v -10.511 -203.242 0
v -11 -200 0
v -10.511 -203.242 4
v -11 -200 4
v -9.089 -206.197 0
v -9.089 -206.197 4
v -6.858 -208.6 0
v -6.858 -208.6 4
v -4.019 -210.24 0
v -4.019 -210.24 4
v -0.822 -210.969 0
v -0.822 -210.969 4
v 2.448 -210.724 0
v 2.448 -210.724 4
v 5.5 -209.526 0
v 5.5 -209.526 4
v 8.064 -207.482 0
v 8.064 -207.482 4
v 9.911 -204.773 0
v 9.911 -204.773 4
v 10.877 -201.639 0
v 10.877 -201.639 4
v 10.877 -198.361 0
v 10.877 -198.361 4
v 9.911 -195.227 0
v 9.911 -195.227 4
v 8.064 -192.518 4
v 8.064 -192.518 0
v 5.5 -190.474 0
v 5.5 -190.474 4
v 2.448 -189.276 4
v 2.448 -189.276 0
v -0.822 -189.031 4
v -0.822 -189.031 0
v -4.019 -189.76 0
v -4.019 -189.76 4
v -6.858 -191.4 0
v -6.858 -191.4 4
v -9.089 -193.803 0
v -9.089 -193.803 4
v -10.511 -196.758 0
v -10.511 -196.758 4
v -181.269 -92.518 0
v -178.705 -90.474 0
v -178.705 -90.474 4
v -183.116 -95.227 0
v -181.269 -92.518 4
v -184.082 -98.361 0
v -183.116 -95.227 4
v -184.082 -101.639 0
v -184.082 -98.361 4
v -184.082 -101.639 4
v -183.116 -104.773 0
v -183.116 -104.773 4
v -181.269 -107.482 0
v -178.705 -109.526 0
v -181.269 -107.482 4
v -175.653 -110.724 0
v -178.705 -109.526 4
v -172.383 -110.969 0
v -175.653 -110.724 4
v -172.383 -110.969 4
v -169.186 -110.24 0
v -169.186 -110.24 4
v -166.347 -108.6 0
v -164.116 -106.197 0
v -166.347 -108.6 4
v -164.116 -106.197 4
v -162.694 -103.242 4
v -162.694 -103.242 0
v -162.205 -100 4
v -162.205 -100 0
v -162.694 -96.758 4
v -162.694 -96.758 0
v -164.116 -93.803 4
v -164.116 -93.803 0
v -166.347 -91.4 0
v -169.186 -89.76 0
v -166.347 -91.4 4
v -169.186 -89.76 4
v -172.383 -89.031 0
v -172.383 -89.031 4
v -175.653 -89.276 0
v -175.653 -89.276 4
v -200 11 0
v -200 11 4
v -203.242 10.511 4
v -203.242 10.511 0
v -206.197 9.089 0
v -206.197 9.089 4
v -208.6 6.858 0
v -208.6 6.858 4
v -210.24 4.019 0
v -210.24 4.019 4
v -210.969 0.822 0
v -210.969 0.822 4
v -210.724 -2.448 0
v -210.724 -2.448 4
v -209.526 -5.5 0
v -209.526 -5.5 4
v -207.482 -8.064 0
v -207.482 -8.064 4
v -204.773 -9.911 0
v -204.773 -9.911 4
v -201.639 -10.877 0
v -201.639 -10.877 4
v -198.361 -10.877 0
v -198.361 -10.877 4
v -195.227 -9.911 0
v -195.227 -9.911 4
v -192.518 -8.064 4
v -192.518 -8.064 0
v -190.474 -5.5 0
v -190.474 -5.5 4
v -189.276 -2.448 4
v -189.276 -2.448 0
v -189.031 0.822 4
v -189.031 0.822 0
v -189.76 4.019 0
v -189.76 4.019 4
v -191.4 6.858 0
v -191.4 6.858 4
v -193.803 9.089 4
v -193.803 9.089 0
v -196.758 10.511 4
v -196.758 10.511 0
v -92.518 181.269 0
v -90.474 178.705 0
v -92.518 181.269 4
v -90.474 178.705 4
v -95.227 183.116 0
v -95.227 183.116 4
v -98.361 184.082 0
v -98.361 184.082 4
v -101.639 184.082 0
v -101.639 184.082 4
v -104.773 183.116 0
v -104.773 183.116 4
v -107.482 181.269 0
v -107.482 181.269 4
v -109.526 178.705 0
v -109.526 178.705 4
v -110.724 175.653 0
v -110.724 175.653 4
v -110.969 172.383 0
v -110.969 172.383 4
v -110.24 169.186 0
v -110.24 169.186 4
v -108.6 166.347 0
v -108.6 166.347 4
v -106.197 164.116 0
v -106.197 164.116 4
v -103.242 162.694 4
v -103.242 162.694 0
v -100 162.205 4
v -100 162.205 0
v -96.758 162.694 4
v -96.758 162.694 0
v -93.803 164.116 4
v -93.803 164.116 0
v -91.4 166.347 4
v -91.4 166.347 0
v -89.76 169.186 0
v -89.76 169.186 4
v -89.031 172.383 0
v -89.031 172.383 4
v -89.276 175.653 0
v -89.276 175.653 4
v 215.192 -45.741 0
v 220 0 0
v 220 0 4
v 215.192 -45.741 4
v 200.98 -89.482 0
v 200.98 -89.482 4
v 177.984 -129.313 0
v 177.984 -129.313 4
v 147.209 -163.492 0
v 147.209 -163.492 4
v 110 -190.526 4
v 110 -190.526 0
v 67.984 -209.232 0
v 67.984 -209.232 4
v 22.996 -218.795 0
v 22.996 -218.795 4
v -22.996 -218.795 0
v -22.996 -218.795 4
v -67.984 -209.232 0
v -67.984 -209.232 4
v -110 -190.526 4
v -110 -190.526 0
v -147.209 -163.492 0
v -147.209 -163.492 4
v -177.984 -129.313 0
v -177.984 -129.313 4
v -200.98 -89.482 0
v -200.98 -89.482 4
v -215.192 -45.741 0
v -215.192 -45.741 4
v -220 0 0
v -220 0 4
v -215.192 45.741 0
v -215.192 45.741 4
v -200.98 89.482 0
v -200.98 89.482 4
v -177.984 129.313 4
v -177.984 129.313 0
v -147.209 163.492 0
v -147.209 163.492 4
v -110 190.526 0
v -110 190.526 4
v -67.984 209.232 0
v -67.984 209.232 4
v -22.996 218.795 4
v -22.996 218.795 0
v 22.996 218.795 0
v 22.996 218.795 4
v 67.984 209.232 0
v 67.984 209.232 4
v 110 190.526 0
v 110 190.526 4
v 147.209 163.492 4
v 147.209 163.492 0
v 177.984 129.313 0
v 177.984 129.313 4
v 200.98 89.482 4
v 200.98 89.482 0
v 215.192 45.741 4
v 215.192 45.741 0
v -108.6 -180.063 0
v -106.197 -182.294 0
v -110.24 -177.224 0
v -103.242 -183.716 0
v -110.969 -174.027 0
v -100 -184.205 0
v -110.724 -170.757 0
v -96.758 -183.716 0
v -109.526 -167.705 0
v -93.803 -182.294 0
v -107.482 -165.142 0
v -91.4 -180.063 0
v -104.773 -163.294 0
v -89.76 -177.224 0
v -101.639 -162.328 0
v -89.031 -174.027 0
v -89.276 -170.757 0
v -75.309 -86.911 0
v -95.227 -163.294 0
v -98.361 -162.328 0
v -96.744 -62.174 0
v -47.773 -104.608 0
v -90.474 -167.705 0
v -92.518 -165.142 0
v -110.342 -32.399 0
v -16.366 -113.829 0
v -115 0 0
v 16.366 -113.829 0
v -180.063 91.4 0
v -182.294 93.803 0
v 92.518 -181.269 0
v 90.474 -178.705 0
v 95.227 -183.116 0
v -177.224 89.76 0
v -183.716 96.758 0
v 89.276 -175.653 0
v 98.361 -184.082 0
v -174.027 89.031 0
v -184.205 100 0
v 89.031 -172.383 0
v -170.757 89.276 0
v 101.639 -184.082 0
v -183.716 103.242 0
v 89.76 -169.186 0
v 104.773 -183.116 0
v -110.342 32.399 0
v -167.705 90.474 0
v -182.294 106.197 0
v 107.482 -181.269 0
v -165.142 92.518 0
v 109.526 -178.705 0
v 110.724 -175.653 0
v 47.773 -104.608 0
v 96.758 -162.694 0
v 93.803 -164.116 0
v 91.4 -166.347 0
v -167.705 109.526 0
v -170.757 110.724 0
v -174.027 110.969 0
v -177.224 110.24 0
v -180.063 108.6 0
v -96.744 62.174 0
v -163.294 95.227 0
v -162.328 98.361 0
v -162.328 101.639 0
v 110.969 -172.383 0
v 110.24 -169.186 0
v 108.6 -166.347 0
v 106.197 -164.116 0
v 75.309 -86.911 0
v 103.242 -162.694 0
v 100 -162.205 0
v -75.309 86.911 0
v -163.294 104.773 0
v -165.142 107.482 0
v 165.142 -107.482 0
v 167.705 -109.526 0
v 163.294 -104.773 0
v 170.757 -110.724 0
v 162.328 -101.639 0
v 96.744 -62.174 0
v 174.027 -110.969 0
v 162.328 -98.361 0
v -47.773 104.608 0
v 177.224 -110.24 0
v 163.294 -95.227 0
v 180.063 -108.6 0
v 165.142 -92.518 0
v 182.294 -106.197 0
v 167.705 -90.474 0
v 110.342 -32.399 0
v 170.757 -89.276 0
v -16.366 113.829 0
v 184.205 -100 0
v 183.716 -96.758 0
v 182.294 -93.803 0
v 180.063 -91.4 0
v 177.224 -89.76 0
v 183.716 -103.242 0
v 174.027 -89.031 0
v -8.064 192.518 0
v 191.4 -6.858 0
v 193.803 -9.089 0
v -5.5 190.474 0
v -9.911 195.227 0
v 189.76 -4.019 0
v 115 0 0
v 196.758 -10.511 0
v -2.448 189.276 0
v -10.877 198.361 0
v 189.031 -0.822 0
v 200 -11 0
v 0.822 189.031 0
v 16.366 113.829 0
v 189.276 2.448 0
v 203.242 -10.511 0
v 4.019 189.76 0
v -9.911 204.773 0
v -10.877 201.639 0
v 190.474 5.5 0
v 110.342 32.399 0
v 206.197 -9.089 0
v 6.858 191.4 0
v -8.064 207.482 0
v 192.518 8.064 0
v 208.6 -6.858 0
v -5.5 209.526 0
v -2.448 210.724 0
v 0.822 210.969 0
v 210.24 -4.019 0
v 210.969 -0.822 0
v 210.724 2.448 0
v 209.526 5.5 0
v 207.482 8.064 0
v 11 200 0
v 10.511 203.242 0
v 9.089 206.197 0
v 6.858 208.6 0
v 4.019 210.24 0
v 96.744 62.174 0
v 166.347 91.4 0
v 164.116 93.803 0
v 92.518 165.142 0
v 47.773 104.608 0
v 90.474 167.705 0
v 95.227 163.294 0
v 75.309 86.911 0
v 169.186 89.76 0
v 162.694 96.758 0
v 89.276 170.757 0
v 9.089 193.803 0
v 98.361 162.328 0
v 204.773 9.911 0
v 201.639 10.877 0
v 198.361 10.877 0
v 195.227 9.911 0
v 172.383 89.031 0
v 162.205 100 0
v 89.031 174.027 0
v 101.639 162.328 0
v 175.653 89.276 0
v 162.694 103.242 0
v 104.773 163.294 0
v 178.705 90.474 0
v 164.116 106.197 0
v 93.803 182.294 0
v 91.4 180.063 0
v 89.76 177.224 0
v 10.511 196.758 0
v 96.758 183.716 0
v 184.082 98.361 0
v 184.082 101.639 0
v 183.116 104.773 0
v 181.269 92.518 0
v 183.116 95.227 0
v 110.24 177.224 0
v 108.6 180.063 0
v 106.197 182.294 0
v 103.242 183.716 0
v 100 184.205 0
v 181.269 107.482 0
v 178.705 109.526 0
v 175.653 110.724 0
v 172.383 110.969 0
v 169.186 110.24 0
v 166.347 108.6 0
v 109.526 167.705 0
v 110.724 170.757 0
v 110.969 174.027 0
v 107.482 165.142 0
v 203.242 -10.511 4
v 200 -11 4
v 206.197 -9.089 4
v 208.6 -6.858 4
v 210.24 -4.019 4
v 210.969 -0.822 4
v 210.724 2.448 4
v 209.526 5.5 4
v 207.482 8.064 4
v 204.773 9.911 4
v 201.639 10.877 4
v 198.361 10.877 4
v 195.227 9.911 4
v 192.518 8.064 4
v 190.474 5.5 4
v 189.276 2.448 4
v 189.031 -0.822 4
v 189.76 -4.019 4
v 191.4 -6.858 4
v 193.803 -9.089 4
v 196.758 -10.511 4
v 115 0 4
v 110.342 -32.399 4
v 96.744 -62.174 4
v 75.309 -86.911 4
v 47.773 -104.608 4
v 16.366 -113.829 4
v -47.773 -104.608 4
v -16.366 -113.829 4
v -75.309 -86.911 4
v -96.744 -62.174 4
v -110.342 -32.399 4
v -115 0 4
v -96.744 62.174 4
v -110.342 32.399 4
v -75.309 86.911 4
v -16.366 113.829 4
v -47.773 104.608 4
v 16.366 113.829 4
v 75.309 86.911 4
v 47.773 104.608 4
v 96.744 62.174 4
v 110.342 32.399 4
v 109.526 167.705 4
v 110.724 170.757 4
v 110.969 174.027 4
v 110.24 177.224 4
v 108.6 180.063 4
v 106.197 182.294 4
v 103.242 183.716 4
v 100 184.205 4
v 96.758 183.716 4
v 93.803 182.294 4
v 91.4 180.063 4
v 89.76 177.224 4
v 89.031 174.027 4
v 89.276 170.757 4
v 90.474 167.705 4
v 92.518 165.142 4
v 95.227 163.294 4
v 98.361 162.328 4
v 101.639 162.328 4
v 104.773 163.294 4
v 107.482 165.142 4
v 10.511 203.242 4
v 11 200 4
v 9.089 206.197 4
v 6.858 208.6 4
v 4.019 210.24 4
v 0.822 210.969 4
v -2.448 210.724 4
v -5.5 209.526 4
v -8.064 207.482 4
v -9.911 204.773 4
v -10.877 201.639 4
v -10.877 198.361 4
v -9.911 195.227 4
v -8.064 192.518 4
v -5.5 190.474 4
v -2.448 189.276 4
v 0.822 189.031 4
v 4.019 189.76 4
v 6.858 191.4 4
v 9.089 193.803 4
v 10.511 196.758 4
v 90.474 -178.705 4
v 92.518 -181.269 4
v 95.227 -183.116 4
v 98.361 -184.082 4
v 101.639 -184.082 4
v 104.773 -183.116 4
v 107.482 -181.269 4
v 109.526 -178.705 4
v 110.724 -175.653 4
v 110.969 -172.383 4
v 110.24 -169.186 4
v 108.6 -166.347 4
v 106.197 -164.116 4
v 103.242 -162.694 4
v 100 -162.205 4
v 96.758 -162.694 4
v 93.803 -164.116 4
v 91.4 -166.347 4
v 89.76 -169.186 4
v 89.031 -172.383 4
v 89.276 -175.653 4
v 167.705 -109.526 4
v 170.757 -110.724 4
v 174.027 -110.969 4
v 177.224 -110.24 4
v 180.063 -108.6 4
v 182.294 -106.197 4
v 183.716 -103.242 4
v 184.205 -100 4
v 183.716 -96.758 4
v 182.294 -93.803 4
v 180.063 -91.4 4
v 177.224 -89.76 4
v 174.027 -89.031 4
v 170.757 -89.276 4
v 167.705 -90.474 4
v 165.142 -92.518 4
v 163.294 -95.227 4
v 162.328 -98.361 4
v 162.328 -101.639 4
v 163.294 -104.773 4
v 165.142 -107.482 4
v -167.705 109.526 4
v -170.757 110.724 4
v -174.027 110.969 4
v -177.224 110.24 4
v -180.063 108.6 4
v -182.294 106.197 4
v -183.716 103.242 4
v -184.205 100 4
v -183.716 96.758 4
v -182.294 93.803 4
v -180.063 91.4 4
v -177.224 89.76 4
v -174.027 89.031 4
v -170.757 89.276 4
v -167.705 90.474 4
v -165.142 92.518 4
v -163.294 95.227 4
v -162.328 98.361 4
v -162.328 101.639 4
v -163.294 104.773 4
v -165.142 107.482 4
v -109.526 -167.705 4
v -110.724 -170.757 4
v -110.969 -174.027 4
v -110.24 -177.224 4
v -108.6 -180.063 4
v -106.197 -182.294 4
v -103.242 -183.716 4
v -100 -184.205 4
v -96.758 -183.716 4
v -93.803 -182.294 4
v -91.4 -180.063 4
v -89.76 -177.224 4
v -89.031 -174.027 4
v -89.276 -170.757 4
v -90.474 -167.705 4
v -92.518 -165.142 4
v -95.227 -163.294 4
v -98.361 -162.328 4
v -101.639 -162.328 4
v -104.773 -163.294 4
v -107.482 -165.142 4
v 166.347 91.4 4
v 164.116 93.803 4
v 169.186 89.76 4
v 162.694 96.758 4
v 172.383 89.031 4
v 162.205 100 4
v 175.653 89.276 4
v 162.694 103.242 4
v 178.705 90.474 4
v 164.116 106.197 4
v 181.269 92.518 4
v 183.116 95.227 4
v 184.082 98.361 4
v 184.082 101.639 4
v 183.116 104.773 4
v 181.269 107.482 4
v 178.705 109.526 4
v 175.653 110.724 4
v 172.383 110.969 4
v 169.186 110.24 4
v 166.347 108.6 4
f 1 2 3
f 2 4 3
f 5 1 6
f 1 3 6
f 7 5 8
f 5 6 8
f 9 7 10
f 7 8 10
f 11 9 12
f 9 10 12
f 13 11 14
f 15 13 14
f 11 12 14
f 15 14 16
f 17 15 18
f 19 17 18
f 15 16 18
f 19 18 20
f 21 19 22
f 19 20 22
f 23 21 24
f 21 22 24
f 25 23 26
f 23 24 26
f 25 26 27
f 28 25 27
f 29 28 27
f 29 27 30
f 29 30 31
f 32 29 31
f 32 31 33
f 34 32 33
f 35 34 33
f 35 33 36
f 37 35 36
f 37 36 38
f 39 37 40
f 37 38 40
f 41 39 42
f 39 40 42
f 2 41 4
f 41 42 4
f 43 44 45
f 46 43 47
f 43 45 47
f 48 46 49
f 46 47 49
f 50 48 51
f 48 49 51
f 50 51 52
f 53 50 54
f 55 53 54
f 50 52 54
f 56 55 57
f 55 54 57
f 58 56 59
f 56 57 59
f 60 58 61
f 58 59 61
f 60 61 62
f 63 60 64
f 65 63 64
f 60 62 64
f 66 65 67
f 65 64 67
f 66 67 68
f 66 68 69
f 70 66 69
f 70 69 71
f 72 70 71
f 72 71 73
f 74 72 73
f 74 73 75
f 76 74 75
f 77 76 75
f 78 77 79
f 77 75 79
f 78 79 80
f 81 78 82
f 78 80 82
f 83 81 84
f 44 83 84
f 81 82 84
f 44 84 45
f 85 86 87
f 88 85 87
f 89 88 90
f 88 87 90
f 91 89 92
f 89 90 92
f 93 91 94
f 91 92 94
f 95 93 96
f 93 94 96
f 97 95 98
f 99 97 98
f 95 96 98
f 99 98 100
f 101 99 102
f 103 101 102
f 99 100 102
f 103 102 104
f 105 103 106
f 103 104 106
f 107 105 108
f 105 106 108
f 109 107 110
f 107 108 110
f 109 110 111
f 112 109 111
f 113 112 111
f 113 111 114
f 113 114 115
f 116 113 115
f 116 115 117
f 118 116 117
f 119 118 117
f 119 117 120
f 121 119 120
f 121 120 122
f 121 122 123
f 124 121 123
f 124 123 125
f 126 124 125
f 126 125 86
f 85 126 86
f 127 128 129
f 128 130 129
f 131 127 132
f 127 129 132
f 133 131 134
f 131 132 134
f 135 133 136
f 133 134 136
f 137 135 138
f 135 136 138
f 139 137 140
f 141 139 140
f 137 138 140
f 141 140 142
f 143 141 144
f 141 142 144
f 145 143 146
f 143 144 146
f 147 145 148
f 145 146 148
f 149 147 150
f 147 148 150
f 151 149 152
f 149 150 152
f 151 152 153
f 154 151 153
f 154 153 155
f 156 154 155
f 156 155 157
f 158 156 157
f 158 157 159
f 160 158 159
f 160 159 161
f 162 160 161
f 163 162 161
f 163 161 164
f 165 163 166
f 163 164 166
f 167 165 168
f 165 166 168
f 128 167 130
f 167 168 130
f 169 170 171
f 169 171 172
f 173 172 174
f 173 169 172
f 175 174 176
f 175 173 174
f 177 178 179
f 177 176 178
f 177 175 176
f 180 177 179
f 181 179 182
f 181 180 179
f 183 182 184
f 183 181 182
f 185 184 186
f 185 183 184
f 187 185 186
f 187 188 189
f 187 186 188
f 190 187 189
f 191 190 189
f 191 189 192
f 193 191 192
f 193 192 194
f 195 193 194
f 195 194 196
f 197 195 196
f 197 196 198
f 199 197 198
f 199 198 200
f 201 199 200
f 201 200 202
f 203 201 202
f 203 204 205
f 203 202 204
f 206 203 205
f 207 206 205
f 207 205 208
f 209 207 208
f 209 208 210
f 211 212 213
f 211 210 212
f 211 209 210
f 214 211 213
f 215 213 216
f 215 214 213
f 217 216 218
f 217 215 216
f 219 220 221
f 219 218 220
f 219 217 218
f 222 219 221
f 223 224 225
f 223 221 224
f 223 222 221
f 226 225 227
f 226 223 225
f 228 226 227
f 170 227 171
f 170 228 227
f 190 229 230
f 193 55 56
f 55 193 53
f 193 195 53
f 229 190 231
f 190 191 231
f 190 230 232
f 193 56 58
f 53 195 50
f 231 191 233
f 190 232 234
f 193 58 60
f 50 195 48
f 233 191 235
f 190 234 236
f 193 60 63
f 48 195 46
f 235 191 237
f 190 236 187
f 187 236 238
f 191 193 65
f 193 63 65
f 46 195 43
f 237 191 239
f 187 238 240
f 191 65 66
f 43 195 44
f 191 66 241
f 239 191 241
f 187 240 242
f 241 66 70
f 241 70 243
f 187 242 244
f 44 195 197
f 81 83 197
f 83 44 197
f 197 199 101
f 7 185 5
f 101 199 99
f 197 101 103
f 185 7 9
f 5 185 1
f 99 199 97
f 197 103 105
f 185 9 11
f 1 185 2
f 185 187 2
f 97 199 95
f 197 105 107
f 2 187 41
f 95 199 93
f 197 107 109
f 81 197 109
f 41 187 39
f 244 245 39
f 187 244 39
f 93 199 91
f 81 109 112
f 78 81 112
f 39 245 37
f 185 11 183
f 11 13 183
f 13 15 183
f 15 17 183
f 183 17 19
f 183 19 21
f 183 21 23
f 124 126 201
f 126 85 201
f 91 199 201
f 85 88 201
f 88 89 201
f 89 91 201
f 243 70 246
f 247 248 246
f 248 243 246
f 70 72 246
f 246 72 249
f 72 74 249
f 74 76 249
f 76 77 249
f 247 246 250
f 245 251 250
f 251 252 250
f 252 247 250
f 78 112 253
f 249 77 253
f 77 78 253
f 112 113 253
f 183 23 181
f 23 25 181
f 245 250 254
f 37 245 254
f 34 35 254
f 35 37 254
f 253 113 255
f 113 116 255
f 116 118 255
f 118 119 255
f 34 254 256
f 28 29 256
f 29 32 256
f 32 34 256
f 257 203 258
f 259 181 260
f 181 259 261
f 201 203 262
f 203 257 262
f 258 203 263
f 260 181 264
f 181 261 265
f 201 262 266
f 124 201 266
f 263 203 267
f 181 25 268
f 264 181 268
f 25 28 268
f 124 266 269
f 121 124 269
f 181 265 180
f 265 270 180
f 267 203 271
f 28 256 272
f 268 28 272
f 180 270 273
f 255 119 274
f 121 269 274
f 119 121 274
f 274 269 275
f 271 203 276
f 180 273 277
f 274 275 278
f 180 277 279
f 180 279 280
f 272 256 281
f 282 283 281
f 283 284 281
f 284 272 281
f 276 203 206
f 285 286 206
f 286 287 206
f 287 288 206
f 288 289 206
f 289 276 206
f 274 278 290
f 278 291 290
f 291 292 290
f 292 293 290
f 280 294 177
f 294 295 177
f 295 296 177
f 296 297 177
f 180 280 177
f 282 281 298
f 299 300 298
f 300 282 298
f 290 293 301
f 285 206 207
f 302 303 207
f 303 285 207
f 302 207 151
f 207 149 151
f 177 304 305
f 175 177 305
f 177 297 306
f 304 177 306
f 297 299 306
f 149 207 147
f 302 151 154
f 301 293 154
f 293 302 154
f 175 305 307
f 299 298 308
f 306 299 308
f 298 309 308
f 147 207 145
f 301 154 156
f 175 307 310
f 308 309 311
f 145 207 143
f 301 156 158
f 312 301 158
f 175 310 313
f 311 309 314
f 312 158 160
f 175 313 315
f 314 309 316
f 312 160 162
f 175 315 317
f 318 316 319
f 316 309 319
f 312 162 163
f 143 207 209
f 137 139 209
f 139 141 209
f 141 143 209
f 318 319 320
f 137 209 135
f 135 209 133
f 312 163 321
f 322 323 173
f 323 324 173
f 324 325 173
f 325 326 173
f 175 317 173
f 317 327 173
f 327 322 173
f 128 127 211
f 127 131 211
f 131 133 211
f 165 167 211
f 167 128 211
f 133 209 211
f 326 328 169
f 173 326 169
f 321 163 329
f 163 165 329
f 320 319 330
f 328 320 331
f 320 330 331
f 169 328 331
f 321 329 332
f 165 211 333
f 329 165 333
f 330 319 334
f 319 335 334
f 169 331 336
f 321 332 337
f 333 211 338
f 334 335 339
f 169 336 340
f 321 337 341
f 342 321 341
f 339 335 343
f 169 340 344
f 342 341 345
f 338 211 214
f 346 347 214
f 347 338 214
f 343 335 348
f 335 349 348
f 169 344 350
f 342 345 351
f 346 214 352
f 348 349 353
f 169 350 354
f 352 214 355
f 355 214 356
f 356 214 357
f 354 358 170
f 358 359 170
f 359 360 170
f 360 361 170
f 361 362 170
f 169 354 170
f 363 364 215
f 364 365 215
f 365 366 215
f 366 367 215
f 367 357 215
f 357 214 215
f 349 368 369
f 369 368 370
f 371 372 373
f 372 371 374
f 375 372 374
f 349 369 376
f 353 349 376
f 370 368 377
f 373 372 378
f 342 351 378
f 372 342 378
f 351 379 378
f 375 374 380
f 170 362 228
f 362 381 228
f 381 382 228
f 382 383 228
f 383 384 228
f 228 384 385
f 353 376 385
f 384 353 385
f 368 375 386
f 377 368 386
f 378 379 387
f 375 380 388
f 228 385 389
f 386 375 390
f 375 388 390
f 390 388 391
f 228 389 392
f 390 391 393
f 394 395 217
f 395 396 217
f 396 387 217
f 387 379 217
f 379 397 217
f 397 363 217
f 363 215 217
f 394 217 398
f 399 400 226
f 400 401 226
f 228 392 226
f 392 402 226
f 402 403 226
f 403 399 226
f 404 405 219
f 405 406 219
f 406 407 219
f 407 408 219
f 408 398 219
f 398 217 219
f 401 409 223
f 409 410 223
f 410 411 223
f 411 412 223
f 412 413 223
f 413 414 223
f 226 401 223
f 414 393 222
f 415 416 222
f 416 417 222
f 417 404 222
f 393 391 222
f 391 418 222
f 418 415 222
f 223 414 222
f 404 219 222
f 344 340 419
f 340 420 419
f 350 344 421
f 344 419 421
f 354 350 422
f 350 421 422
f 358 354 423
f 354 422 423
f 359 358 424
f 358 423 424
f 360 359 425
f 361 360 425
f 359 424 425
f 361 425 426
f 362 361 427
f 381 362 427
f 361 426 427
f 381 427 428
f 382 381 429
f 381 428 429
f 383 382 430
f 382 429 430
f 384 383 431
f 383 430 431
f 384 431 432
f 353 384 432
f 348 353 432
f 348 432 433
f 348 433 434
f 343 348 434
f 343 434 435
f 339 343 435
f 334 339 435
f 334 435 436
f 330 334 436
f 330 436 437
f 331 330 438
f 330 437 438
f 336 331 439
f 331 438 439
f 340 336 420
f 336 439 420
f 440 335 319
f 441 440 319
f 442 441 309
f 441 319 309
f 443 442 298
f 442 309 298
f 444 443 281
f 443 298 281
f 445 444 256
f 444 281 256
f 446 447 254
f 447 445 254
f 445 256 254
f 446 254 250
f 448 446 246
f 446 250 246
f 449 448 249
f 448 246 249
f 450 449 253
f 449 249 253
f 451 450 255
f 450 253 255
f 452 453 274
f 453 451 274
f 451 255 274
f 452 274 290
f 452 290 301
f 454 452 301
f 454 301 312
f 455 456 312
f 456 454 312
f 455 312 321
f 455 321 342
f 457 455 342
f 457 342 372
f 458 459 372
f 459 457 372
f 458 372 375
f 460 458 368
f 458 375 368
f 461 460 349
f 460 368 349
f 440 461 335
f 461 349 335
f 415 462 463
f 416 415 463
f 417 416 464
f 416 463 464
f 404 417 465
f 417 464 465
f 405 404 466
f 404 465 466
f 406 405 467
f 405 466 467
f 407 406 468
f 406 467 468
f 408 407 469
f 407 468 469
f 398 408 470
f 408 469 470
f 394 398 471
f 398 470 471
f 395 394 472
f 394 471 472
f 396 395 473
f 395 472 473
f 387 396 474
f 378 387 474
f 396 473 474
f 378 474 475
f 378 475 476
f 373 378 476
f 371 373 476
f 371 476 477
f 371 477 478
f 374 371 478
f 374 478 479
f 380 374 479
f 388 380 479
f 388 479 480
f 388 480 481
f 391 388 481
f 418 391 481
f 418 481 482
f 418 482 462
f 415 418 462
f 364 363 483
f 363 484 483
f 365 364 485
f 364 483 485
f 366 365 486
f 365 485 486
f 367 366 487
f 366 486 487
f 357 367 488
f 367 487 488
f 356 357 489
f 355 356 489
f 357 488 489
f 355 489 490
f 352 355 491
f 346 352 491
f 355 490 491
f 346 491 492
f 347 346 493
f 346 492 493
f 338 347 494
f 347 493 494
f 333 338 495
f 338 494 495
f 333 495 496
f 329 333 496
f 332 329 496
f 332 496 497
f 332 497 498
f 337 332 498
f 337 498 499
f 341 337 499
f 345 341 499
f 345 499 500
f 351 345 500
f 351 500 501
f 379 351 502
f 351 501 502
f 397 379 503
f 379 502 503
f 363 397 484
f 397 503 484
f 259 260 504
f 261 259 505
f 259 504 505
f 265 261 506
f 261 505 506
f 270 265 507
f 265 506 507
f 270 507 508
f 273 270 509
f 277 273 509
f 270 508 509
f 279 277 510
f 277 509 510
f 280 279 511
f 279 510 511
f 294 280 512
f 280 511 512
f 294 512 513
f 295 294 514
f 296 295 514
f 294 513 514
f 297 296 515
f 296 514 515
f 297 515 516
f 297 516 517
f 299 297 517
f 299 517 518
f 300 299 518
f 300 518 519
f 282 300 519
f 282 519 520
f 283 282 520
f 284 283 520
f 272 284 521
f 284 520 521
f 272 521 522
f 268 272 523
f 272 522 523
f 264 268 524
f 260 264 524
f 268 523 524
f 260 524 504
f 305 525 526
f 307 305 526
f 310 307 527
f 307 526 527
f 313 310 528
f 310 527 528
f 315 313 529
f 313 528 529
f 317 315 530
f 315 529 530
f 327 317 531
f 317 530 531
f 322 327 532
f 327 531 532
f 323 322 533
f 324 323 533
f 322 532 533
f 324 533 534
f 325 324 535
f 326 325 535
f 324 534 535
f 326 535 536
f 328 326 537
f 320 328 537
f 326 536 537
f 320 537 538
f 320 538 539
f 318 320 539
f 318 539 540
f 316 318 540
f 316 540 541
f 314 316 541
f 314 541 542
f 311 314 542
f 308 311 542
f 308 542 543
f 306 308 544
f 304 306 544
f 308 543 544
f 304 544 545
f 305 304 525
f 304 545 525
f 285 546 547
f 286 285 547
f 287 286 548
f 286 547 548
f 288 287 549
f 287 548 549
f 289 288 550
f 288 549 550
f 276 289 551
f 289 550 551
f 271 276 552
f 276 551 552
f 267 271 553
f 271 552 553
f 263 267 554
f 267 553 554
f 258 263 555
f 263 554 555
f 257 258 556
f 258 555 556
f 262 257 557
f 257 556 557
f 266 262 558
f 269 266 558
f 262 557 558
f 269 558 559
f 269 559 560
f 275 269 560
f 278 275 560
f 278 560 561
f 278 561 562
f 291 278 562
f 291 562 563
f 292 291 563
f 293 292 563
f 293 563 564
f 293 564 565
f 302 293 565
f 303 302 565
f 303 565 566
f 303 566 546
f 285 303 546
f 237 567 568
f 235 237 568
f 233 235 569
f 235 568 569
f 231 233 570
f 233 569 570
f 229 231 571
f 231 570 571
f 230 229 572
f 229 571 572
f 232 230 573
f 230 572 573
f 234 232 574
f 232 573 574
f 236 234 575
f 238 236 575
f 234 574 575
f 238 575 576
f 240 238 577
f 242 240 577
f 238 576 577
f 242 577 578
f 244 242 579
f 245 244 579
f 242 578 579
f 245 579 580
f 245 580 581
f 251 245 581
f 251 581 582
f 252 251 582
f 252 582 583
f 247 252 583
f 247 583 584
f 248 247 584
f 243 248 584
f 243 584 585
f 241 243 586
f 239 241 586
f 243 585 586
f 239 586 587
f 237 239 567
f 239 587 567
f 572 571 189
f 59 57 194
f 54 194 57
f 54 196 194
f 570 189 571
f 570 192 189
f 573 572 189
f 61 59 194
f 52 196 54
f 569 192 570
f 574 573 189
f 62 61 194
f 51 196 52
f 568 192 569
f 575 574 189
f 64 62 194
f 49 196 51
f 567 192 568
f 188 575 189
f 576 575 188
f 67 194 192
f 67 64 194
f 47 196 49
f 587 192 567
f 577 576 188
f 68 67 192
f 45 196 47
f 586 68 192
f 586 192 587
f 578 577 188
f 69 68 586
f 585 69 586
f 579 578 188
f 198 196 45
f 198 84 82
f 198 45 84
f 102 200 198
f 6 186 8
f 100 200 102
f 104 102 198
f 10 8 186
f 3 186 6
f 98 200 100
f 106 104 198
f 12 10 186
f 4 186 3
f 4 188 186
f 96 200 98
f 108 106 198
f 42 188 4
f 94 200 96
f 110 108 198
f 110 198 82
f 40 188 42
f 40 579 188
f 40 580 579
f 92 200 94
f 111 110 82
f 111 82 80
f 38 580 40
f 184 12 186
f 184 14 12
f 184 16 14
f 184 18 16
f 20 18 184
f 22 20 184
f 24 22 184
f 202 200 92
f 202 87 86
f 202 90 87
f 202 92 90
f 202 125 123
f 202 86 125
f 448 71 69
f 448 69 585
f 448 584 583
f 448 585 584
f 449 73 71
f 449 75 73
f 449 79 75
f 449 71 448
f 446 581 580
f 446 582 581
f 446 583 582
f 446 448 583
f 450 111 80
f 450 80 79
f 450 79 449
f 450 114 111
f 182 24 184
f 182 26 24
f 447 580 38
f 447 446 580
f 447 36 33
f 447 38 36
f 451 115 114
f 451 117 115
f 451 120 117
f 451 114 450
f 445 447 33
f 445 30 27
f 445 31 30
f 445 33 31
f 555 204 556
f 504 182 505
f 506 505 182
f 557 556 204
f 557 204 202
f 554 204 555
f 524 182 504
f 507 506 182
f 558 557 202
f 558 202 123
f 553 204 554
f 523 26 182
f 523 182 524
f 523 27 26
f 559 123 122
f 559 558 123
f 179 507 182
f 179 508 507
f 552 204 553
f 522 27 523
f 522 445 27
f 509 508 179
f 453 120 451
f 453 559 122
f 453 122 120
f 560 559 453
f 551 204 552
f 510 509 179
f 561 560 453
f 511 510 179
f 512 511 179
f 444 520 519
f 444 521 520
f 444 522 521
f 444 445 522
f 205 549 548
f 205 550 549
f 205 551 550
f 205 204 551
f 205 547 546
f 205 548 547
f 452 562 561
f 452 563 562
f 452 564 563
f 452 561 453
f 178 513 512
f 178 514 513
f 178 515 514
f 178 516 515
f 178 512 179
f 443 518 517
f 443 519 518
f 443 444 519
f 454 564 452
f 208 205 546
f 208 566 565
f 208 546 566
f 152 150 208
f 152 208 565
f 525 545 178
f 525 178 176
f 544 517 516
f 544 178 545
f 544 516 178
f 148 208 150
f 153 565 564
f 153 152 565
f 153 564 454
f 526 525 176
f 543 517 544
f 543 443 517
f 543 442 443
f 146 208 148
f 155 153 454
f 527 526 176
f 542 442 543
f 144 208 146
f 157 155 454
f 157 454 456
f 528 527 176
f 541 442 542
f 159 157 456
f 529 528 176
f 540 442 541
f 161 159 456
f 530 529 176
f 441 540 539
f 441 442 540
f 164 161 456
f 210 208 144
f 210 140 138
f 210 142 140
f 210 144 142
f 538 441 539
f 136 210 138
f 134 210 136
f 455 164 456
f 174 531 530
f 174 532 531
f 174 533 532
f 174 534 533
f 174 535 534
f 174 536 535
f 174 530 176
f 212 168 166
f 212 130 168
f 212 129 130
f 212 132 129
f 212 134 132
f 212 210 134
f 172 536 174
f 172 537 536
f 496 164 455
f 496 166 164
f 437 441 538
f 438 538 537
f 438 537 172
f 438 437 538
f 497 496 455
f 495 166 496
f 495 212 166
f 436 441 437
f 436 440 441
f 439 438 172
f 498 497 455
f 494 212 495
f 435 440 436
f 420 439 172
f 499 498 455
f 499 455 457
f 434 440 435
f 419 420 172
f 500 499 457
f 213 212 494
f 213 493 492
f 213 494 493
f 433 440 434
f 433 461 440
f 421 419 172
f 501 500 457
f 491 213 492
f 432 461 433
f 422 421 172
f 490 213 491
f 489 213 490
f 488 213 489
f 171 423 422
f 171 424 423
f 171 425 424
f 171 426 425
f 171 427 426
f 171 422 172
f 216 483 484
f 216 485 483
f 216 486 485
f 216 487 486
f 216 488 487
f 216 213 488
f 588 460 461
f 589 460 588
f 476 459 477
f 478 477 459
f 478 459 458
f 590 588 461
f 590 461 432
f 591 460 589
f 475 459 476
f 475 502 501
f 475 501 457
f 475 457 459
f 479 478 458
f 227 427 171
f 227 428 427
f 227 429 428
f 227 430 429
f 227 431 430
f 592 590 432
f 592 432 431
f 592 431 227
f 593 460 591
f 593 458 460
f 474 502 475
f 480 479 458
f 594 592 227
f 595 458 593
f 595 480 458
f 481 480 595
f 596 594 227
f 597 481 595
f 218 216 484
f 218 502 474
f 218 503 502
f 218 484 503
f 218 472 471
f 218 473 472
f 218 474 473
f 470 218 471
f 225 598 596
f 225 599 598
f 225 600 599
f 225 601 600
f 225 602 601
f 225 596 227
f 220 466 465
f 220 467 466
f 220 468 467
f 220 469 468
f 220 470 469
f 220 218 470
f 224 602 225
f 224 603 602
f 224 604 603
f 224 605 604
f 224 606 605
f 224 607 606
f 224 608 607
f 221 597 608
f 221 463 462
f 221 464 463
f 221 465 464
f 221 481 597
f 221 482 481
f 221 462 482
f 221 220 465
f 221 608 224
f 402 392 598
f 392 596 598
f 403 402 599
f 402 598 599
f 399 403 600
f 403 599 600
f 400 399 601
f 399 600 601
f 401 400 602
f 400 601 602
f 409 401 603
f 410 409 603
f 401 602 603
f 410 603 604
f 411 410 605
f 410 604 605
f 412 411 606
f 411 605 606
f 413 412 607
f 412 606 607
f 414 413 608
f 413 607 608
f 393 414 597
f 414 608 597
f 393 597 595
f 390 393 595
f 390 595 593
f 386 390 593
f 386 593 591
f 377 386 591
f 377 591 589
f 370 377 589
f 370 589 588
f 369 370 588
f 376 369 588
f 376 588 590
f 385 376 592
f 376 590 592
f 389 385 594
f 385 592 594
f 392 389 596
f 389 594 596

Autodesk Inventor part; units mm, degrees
ref_plane "YZ Plane" through (0, 0, 0) normal (1, 0, 0) x (0, 1, 0)
ref_plane "XZ Plane" through (0, 0, 0) normal (0, 1, 0) x (-1, 0, 0)
ref_plane "XY Plane" through (0, 0, 0) normal (0, 0, 1) x (1, 0, 0)
sketch "Sketch1" plane through (0, 0, 0) normal (0, 0, 1) x (1, 0, 0)
  circle A0 centre (0, 0) radius 115
  circle A1 centre (0, 0) radius 220
  dimension "d22" = 230
  dimension "d23" = 440
extrude "Plate1" add sketch "Sketch1" along normal blind 4
sketch "Sketch5" plane through (0, 0, 4) normal (0, 0, 1) x (1, 0, 0)
  circle A0 centre (0, 200) radius 11
  circle A1 centre (0, 0) radius 200 construction
  dimension "d25" = 400
  dimension "d24" = 22
extrude "Cut1" cut sketch "Sketch5" against normal blind 4
pattern_circular "Circular Pattern1" count 12 over 360 about axis through (0, 0, 0) along (0, 0, 1) of "Cut1"
equation "\"d26\" = Thickness"
equation "\"d2\" = Thickness"
equation "\"BendReliefWidth\" = Thickness"
equation "\"BendReliefDepth\" = 0.5 * Thickness"
equation "\"CornerReliefSize\" = 4 * Thickness"
equation "\"MinimumRemnant\" = 2 * Thickness"
equation "\"TransitionRadius\" = BendRadius"
equation "\"JacobiRadiusSize\" = BendRadius"
equation "\"GapSize\" = Thickness"
equation "\"Thickness\" = 4"
equation "\"BendRadius\" = 5"
properties part number "TKS 3212 flange separator" material "Stainless Steel"
